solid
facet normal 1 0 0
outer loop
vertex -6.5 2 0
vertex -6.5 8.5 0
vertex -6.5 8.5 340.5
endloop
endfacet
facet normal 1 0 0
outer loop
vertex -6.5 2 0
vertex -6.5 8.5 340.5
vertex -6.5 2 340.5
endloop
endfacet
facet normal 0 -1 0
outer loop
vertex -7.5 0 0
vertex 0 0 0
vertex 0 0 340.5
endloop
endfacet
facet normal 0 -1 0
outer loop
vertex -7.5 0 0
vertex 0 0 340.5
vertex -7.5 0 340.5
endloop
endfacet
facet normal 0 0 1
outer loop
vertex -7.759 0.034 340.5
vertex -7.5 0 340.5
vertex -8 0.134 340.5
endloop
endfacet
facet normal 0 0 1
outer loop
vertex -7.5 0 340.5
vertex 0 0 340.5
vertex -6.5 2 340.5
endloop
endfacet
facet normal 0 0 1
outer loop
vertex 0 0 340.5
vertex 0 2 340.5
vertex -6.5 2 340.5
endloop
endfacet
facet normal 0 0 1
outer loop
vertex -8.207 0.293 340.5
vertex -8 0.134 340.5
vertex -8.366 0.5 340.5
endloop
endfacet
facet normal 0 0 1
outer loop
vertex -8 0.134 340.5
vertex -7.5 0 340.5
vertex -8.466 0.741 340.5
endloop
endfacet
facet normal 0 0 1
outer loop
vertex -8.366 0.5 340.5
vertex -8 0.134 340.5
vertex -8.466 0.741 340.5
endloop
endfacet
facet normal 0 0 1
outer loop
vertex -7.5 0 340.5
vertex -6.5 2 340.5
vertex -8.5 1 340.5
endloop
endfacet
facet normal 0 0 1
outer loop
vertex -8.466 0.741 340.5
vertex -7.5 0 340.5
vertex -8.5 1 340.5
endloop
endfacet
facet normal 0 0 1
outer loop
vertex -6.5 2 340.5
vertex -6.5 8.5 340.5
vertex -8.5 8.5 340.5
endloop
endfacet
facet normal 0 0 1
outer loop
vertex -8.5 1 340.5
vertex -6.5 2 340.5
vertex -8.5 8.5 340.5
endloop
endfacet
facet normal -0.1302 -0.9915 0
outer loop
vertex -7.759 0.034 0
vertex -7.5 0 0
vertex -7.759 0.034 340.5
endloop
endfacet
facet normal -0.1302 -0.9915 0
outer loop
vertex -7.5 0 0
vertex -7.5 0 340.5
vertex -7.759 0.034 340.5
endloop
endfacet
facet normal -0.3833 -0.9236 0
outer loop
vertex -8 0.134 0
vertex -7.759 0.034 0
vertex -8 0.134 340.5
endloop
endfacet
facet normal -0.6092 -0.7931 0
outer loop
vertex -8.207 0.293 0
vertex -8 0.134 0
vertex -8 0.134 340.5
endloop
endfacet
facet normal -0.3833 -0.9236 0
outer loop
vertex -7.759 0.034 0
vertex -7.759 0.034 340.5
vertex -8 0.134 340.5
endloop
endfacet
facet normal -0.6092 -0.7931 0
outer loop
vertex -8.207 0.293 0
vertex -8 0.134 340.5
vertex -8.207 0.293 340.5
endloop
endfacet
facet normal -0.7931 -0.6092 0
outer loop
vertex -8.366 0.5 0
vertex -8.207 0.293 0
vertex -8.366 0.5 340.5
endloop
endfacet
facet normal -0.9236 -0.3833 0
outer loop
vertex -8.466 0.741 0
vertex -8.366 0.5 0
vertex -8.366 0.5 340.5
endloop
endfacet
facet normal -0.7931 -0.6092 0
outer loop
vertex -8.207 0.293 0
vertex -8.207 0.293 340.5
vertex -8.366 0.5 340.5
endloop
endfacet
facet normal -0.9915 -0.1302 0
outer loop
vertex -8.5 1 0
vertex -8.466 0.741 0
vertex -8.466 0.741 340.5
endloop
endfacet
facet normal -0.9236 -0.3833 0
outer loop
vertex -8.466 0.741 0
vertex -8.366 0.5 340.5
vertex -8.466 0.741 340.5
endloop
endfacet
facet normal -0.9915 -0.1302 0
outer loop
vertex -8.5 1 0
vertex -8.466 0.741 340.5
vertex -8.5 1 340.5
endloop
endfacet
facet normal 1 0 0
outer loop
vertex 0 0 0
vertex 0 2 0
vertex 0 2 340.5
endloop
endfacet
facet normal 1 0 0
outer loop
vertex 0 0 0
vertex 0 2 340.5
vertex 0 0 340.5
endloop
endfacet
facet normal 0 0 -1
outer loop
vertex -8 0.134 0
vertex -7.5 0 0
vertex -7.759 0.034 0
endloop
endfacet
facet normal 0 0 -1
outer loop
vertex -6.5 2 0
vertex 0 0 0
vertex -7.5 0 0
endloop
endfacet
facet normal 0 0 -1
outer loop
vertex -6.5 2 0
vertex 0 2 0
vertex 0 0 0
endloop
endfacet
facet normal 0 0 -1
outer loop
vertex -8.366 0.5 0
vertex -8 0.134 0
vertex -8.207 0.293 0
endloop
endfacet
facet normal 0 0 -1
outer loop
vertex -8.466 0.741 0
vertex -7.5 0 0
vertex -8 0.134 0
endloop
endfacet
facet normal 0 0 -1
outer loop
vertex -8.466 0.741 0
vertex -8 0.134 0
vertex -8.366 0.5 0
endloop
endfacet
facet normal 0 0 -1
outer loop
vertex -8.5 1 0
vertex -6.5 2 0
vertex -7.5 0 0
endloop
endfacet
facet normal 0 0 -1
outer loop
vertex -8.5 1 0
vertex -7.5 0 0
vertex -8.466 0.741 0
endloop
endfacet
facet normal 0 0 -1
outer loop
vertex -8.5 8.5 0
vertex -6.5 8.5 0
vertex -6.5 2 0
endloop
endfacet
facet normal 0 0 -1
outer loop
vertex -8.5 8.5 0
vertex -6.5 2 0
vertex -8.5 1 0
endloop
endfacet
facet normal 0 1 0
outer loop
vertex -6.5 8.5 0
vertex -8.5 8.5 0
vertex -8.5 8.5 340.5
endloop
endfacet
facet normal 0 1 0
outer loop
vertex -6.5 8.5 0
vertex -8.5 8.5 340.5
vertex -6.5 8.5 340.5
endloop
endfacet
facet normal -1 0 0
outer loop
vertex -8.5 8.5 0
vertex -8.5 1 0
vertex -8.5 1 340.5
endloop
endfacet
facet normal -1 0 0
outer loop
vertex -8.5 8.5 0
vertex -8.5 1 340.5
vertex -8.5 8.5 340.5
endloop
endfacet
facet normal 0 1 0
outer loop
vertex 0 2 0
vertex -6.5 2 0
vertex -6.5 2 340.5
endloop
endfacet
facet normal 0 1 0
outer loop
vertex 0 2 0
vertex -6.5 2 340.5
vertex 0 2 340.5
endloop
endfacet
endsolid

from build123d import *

# Parameters (mm, degrees)
BOSS_EXTRUDE1_DEPTH = 340.5
FILLET1_R           = 1


with BuildPart() as part:
    # Sketch1 → Boss-Extrude1 (new body)
    with BuildSketch(Plane.XY):
        Polygon((0, 0), (-8.5, 0), (-8.5, 8.5), (-6.5, 8.5), (-6.5, 2), (0, 2), align=None)
    extrude(amount=BOSS_EXTRUDE1_DEPTH)

    # Fillet1
    fillet1_edges = [part.edges().sort_by_distance(p)[0] for p in [
        (-8.5, 0, 170.25),
    ]]
    fillet(fillet1_edges, radius=FILLET1_R)


solid = part.part
